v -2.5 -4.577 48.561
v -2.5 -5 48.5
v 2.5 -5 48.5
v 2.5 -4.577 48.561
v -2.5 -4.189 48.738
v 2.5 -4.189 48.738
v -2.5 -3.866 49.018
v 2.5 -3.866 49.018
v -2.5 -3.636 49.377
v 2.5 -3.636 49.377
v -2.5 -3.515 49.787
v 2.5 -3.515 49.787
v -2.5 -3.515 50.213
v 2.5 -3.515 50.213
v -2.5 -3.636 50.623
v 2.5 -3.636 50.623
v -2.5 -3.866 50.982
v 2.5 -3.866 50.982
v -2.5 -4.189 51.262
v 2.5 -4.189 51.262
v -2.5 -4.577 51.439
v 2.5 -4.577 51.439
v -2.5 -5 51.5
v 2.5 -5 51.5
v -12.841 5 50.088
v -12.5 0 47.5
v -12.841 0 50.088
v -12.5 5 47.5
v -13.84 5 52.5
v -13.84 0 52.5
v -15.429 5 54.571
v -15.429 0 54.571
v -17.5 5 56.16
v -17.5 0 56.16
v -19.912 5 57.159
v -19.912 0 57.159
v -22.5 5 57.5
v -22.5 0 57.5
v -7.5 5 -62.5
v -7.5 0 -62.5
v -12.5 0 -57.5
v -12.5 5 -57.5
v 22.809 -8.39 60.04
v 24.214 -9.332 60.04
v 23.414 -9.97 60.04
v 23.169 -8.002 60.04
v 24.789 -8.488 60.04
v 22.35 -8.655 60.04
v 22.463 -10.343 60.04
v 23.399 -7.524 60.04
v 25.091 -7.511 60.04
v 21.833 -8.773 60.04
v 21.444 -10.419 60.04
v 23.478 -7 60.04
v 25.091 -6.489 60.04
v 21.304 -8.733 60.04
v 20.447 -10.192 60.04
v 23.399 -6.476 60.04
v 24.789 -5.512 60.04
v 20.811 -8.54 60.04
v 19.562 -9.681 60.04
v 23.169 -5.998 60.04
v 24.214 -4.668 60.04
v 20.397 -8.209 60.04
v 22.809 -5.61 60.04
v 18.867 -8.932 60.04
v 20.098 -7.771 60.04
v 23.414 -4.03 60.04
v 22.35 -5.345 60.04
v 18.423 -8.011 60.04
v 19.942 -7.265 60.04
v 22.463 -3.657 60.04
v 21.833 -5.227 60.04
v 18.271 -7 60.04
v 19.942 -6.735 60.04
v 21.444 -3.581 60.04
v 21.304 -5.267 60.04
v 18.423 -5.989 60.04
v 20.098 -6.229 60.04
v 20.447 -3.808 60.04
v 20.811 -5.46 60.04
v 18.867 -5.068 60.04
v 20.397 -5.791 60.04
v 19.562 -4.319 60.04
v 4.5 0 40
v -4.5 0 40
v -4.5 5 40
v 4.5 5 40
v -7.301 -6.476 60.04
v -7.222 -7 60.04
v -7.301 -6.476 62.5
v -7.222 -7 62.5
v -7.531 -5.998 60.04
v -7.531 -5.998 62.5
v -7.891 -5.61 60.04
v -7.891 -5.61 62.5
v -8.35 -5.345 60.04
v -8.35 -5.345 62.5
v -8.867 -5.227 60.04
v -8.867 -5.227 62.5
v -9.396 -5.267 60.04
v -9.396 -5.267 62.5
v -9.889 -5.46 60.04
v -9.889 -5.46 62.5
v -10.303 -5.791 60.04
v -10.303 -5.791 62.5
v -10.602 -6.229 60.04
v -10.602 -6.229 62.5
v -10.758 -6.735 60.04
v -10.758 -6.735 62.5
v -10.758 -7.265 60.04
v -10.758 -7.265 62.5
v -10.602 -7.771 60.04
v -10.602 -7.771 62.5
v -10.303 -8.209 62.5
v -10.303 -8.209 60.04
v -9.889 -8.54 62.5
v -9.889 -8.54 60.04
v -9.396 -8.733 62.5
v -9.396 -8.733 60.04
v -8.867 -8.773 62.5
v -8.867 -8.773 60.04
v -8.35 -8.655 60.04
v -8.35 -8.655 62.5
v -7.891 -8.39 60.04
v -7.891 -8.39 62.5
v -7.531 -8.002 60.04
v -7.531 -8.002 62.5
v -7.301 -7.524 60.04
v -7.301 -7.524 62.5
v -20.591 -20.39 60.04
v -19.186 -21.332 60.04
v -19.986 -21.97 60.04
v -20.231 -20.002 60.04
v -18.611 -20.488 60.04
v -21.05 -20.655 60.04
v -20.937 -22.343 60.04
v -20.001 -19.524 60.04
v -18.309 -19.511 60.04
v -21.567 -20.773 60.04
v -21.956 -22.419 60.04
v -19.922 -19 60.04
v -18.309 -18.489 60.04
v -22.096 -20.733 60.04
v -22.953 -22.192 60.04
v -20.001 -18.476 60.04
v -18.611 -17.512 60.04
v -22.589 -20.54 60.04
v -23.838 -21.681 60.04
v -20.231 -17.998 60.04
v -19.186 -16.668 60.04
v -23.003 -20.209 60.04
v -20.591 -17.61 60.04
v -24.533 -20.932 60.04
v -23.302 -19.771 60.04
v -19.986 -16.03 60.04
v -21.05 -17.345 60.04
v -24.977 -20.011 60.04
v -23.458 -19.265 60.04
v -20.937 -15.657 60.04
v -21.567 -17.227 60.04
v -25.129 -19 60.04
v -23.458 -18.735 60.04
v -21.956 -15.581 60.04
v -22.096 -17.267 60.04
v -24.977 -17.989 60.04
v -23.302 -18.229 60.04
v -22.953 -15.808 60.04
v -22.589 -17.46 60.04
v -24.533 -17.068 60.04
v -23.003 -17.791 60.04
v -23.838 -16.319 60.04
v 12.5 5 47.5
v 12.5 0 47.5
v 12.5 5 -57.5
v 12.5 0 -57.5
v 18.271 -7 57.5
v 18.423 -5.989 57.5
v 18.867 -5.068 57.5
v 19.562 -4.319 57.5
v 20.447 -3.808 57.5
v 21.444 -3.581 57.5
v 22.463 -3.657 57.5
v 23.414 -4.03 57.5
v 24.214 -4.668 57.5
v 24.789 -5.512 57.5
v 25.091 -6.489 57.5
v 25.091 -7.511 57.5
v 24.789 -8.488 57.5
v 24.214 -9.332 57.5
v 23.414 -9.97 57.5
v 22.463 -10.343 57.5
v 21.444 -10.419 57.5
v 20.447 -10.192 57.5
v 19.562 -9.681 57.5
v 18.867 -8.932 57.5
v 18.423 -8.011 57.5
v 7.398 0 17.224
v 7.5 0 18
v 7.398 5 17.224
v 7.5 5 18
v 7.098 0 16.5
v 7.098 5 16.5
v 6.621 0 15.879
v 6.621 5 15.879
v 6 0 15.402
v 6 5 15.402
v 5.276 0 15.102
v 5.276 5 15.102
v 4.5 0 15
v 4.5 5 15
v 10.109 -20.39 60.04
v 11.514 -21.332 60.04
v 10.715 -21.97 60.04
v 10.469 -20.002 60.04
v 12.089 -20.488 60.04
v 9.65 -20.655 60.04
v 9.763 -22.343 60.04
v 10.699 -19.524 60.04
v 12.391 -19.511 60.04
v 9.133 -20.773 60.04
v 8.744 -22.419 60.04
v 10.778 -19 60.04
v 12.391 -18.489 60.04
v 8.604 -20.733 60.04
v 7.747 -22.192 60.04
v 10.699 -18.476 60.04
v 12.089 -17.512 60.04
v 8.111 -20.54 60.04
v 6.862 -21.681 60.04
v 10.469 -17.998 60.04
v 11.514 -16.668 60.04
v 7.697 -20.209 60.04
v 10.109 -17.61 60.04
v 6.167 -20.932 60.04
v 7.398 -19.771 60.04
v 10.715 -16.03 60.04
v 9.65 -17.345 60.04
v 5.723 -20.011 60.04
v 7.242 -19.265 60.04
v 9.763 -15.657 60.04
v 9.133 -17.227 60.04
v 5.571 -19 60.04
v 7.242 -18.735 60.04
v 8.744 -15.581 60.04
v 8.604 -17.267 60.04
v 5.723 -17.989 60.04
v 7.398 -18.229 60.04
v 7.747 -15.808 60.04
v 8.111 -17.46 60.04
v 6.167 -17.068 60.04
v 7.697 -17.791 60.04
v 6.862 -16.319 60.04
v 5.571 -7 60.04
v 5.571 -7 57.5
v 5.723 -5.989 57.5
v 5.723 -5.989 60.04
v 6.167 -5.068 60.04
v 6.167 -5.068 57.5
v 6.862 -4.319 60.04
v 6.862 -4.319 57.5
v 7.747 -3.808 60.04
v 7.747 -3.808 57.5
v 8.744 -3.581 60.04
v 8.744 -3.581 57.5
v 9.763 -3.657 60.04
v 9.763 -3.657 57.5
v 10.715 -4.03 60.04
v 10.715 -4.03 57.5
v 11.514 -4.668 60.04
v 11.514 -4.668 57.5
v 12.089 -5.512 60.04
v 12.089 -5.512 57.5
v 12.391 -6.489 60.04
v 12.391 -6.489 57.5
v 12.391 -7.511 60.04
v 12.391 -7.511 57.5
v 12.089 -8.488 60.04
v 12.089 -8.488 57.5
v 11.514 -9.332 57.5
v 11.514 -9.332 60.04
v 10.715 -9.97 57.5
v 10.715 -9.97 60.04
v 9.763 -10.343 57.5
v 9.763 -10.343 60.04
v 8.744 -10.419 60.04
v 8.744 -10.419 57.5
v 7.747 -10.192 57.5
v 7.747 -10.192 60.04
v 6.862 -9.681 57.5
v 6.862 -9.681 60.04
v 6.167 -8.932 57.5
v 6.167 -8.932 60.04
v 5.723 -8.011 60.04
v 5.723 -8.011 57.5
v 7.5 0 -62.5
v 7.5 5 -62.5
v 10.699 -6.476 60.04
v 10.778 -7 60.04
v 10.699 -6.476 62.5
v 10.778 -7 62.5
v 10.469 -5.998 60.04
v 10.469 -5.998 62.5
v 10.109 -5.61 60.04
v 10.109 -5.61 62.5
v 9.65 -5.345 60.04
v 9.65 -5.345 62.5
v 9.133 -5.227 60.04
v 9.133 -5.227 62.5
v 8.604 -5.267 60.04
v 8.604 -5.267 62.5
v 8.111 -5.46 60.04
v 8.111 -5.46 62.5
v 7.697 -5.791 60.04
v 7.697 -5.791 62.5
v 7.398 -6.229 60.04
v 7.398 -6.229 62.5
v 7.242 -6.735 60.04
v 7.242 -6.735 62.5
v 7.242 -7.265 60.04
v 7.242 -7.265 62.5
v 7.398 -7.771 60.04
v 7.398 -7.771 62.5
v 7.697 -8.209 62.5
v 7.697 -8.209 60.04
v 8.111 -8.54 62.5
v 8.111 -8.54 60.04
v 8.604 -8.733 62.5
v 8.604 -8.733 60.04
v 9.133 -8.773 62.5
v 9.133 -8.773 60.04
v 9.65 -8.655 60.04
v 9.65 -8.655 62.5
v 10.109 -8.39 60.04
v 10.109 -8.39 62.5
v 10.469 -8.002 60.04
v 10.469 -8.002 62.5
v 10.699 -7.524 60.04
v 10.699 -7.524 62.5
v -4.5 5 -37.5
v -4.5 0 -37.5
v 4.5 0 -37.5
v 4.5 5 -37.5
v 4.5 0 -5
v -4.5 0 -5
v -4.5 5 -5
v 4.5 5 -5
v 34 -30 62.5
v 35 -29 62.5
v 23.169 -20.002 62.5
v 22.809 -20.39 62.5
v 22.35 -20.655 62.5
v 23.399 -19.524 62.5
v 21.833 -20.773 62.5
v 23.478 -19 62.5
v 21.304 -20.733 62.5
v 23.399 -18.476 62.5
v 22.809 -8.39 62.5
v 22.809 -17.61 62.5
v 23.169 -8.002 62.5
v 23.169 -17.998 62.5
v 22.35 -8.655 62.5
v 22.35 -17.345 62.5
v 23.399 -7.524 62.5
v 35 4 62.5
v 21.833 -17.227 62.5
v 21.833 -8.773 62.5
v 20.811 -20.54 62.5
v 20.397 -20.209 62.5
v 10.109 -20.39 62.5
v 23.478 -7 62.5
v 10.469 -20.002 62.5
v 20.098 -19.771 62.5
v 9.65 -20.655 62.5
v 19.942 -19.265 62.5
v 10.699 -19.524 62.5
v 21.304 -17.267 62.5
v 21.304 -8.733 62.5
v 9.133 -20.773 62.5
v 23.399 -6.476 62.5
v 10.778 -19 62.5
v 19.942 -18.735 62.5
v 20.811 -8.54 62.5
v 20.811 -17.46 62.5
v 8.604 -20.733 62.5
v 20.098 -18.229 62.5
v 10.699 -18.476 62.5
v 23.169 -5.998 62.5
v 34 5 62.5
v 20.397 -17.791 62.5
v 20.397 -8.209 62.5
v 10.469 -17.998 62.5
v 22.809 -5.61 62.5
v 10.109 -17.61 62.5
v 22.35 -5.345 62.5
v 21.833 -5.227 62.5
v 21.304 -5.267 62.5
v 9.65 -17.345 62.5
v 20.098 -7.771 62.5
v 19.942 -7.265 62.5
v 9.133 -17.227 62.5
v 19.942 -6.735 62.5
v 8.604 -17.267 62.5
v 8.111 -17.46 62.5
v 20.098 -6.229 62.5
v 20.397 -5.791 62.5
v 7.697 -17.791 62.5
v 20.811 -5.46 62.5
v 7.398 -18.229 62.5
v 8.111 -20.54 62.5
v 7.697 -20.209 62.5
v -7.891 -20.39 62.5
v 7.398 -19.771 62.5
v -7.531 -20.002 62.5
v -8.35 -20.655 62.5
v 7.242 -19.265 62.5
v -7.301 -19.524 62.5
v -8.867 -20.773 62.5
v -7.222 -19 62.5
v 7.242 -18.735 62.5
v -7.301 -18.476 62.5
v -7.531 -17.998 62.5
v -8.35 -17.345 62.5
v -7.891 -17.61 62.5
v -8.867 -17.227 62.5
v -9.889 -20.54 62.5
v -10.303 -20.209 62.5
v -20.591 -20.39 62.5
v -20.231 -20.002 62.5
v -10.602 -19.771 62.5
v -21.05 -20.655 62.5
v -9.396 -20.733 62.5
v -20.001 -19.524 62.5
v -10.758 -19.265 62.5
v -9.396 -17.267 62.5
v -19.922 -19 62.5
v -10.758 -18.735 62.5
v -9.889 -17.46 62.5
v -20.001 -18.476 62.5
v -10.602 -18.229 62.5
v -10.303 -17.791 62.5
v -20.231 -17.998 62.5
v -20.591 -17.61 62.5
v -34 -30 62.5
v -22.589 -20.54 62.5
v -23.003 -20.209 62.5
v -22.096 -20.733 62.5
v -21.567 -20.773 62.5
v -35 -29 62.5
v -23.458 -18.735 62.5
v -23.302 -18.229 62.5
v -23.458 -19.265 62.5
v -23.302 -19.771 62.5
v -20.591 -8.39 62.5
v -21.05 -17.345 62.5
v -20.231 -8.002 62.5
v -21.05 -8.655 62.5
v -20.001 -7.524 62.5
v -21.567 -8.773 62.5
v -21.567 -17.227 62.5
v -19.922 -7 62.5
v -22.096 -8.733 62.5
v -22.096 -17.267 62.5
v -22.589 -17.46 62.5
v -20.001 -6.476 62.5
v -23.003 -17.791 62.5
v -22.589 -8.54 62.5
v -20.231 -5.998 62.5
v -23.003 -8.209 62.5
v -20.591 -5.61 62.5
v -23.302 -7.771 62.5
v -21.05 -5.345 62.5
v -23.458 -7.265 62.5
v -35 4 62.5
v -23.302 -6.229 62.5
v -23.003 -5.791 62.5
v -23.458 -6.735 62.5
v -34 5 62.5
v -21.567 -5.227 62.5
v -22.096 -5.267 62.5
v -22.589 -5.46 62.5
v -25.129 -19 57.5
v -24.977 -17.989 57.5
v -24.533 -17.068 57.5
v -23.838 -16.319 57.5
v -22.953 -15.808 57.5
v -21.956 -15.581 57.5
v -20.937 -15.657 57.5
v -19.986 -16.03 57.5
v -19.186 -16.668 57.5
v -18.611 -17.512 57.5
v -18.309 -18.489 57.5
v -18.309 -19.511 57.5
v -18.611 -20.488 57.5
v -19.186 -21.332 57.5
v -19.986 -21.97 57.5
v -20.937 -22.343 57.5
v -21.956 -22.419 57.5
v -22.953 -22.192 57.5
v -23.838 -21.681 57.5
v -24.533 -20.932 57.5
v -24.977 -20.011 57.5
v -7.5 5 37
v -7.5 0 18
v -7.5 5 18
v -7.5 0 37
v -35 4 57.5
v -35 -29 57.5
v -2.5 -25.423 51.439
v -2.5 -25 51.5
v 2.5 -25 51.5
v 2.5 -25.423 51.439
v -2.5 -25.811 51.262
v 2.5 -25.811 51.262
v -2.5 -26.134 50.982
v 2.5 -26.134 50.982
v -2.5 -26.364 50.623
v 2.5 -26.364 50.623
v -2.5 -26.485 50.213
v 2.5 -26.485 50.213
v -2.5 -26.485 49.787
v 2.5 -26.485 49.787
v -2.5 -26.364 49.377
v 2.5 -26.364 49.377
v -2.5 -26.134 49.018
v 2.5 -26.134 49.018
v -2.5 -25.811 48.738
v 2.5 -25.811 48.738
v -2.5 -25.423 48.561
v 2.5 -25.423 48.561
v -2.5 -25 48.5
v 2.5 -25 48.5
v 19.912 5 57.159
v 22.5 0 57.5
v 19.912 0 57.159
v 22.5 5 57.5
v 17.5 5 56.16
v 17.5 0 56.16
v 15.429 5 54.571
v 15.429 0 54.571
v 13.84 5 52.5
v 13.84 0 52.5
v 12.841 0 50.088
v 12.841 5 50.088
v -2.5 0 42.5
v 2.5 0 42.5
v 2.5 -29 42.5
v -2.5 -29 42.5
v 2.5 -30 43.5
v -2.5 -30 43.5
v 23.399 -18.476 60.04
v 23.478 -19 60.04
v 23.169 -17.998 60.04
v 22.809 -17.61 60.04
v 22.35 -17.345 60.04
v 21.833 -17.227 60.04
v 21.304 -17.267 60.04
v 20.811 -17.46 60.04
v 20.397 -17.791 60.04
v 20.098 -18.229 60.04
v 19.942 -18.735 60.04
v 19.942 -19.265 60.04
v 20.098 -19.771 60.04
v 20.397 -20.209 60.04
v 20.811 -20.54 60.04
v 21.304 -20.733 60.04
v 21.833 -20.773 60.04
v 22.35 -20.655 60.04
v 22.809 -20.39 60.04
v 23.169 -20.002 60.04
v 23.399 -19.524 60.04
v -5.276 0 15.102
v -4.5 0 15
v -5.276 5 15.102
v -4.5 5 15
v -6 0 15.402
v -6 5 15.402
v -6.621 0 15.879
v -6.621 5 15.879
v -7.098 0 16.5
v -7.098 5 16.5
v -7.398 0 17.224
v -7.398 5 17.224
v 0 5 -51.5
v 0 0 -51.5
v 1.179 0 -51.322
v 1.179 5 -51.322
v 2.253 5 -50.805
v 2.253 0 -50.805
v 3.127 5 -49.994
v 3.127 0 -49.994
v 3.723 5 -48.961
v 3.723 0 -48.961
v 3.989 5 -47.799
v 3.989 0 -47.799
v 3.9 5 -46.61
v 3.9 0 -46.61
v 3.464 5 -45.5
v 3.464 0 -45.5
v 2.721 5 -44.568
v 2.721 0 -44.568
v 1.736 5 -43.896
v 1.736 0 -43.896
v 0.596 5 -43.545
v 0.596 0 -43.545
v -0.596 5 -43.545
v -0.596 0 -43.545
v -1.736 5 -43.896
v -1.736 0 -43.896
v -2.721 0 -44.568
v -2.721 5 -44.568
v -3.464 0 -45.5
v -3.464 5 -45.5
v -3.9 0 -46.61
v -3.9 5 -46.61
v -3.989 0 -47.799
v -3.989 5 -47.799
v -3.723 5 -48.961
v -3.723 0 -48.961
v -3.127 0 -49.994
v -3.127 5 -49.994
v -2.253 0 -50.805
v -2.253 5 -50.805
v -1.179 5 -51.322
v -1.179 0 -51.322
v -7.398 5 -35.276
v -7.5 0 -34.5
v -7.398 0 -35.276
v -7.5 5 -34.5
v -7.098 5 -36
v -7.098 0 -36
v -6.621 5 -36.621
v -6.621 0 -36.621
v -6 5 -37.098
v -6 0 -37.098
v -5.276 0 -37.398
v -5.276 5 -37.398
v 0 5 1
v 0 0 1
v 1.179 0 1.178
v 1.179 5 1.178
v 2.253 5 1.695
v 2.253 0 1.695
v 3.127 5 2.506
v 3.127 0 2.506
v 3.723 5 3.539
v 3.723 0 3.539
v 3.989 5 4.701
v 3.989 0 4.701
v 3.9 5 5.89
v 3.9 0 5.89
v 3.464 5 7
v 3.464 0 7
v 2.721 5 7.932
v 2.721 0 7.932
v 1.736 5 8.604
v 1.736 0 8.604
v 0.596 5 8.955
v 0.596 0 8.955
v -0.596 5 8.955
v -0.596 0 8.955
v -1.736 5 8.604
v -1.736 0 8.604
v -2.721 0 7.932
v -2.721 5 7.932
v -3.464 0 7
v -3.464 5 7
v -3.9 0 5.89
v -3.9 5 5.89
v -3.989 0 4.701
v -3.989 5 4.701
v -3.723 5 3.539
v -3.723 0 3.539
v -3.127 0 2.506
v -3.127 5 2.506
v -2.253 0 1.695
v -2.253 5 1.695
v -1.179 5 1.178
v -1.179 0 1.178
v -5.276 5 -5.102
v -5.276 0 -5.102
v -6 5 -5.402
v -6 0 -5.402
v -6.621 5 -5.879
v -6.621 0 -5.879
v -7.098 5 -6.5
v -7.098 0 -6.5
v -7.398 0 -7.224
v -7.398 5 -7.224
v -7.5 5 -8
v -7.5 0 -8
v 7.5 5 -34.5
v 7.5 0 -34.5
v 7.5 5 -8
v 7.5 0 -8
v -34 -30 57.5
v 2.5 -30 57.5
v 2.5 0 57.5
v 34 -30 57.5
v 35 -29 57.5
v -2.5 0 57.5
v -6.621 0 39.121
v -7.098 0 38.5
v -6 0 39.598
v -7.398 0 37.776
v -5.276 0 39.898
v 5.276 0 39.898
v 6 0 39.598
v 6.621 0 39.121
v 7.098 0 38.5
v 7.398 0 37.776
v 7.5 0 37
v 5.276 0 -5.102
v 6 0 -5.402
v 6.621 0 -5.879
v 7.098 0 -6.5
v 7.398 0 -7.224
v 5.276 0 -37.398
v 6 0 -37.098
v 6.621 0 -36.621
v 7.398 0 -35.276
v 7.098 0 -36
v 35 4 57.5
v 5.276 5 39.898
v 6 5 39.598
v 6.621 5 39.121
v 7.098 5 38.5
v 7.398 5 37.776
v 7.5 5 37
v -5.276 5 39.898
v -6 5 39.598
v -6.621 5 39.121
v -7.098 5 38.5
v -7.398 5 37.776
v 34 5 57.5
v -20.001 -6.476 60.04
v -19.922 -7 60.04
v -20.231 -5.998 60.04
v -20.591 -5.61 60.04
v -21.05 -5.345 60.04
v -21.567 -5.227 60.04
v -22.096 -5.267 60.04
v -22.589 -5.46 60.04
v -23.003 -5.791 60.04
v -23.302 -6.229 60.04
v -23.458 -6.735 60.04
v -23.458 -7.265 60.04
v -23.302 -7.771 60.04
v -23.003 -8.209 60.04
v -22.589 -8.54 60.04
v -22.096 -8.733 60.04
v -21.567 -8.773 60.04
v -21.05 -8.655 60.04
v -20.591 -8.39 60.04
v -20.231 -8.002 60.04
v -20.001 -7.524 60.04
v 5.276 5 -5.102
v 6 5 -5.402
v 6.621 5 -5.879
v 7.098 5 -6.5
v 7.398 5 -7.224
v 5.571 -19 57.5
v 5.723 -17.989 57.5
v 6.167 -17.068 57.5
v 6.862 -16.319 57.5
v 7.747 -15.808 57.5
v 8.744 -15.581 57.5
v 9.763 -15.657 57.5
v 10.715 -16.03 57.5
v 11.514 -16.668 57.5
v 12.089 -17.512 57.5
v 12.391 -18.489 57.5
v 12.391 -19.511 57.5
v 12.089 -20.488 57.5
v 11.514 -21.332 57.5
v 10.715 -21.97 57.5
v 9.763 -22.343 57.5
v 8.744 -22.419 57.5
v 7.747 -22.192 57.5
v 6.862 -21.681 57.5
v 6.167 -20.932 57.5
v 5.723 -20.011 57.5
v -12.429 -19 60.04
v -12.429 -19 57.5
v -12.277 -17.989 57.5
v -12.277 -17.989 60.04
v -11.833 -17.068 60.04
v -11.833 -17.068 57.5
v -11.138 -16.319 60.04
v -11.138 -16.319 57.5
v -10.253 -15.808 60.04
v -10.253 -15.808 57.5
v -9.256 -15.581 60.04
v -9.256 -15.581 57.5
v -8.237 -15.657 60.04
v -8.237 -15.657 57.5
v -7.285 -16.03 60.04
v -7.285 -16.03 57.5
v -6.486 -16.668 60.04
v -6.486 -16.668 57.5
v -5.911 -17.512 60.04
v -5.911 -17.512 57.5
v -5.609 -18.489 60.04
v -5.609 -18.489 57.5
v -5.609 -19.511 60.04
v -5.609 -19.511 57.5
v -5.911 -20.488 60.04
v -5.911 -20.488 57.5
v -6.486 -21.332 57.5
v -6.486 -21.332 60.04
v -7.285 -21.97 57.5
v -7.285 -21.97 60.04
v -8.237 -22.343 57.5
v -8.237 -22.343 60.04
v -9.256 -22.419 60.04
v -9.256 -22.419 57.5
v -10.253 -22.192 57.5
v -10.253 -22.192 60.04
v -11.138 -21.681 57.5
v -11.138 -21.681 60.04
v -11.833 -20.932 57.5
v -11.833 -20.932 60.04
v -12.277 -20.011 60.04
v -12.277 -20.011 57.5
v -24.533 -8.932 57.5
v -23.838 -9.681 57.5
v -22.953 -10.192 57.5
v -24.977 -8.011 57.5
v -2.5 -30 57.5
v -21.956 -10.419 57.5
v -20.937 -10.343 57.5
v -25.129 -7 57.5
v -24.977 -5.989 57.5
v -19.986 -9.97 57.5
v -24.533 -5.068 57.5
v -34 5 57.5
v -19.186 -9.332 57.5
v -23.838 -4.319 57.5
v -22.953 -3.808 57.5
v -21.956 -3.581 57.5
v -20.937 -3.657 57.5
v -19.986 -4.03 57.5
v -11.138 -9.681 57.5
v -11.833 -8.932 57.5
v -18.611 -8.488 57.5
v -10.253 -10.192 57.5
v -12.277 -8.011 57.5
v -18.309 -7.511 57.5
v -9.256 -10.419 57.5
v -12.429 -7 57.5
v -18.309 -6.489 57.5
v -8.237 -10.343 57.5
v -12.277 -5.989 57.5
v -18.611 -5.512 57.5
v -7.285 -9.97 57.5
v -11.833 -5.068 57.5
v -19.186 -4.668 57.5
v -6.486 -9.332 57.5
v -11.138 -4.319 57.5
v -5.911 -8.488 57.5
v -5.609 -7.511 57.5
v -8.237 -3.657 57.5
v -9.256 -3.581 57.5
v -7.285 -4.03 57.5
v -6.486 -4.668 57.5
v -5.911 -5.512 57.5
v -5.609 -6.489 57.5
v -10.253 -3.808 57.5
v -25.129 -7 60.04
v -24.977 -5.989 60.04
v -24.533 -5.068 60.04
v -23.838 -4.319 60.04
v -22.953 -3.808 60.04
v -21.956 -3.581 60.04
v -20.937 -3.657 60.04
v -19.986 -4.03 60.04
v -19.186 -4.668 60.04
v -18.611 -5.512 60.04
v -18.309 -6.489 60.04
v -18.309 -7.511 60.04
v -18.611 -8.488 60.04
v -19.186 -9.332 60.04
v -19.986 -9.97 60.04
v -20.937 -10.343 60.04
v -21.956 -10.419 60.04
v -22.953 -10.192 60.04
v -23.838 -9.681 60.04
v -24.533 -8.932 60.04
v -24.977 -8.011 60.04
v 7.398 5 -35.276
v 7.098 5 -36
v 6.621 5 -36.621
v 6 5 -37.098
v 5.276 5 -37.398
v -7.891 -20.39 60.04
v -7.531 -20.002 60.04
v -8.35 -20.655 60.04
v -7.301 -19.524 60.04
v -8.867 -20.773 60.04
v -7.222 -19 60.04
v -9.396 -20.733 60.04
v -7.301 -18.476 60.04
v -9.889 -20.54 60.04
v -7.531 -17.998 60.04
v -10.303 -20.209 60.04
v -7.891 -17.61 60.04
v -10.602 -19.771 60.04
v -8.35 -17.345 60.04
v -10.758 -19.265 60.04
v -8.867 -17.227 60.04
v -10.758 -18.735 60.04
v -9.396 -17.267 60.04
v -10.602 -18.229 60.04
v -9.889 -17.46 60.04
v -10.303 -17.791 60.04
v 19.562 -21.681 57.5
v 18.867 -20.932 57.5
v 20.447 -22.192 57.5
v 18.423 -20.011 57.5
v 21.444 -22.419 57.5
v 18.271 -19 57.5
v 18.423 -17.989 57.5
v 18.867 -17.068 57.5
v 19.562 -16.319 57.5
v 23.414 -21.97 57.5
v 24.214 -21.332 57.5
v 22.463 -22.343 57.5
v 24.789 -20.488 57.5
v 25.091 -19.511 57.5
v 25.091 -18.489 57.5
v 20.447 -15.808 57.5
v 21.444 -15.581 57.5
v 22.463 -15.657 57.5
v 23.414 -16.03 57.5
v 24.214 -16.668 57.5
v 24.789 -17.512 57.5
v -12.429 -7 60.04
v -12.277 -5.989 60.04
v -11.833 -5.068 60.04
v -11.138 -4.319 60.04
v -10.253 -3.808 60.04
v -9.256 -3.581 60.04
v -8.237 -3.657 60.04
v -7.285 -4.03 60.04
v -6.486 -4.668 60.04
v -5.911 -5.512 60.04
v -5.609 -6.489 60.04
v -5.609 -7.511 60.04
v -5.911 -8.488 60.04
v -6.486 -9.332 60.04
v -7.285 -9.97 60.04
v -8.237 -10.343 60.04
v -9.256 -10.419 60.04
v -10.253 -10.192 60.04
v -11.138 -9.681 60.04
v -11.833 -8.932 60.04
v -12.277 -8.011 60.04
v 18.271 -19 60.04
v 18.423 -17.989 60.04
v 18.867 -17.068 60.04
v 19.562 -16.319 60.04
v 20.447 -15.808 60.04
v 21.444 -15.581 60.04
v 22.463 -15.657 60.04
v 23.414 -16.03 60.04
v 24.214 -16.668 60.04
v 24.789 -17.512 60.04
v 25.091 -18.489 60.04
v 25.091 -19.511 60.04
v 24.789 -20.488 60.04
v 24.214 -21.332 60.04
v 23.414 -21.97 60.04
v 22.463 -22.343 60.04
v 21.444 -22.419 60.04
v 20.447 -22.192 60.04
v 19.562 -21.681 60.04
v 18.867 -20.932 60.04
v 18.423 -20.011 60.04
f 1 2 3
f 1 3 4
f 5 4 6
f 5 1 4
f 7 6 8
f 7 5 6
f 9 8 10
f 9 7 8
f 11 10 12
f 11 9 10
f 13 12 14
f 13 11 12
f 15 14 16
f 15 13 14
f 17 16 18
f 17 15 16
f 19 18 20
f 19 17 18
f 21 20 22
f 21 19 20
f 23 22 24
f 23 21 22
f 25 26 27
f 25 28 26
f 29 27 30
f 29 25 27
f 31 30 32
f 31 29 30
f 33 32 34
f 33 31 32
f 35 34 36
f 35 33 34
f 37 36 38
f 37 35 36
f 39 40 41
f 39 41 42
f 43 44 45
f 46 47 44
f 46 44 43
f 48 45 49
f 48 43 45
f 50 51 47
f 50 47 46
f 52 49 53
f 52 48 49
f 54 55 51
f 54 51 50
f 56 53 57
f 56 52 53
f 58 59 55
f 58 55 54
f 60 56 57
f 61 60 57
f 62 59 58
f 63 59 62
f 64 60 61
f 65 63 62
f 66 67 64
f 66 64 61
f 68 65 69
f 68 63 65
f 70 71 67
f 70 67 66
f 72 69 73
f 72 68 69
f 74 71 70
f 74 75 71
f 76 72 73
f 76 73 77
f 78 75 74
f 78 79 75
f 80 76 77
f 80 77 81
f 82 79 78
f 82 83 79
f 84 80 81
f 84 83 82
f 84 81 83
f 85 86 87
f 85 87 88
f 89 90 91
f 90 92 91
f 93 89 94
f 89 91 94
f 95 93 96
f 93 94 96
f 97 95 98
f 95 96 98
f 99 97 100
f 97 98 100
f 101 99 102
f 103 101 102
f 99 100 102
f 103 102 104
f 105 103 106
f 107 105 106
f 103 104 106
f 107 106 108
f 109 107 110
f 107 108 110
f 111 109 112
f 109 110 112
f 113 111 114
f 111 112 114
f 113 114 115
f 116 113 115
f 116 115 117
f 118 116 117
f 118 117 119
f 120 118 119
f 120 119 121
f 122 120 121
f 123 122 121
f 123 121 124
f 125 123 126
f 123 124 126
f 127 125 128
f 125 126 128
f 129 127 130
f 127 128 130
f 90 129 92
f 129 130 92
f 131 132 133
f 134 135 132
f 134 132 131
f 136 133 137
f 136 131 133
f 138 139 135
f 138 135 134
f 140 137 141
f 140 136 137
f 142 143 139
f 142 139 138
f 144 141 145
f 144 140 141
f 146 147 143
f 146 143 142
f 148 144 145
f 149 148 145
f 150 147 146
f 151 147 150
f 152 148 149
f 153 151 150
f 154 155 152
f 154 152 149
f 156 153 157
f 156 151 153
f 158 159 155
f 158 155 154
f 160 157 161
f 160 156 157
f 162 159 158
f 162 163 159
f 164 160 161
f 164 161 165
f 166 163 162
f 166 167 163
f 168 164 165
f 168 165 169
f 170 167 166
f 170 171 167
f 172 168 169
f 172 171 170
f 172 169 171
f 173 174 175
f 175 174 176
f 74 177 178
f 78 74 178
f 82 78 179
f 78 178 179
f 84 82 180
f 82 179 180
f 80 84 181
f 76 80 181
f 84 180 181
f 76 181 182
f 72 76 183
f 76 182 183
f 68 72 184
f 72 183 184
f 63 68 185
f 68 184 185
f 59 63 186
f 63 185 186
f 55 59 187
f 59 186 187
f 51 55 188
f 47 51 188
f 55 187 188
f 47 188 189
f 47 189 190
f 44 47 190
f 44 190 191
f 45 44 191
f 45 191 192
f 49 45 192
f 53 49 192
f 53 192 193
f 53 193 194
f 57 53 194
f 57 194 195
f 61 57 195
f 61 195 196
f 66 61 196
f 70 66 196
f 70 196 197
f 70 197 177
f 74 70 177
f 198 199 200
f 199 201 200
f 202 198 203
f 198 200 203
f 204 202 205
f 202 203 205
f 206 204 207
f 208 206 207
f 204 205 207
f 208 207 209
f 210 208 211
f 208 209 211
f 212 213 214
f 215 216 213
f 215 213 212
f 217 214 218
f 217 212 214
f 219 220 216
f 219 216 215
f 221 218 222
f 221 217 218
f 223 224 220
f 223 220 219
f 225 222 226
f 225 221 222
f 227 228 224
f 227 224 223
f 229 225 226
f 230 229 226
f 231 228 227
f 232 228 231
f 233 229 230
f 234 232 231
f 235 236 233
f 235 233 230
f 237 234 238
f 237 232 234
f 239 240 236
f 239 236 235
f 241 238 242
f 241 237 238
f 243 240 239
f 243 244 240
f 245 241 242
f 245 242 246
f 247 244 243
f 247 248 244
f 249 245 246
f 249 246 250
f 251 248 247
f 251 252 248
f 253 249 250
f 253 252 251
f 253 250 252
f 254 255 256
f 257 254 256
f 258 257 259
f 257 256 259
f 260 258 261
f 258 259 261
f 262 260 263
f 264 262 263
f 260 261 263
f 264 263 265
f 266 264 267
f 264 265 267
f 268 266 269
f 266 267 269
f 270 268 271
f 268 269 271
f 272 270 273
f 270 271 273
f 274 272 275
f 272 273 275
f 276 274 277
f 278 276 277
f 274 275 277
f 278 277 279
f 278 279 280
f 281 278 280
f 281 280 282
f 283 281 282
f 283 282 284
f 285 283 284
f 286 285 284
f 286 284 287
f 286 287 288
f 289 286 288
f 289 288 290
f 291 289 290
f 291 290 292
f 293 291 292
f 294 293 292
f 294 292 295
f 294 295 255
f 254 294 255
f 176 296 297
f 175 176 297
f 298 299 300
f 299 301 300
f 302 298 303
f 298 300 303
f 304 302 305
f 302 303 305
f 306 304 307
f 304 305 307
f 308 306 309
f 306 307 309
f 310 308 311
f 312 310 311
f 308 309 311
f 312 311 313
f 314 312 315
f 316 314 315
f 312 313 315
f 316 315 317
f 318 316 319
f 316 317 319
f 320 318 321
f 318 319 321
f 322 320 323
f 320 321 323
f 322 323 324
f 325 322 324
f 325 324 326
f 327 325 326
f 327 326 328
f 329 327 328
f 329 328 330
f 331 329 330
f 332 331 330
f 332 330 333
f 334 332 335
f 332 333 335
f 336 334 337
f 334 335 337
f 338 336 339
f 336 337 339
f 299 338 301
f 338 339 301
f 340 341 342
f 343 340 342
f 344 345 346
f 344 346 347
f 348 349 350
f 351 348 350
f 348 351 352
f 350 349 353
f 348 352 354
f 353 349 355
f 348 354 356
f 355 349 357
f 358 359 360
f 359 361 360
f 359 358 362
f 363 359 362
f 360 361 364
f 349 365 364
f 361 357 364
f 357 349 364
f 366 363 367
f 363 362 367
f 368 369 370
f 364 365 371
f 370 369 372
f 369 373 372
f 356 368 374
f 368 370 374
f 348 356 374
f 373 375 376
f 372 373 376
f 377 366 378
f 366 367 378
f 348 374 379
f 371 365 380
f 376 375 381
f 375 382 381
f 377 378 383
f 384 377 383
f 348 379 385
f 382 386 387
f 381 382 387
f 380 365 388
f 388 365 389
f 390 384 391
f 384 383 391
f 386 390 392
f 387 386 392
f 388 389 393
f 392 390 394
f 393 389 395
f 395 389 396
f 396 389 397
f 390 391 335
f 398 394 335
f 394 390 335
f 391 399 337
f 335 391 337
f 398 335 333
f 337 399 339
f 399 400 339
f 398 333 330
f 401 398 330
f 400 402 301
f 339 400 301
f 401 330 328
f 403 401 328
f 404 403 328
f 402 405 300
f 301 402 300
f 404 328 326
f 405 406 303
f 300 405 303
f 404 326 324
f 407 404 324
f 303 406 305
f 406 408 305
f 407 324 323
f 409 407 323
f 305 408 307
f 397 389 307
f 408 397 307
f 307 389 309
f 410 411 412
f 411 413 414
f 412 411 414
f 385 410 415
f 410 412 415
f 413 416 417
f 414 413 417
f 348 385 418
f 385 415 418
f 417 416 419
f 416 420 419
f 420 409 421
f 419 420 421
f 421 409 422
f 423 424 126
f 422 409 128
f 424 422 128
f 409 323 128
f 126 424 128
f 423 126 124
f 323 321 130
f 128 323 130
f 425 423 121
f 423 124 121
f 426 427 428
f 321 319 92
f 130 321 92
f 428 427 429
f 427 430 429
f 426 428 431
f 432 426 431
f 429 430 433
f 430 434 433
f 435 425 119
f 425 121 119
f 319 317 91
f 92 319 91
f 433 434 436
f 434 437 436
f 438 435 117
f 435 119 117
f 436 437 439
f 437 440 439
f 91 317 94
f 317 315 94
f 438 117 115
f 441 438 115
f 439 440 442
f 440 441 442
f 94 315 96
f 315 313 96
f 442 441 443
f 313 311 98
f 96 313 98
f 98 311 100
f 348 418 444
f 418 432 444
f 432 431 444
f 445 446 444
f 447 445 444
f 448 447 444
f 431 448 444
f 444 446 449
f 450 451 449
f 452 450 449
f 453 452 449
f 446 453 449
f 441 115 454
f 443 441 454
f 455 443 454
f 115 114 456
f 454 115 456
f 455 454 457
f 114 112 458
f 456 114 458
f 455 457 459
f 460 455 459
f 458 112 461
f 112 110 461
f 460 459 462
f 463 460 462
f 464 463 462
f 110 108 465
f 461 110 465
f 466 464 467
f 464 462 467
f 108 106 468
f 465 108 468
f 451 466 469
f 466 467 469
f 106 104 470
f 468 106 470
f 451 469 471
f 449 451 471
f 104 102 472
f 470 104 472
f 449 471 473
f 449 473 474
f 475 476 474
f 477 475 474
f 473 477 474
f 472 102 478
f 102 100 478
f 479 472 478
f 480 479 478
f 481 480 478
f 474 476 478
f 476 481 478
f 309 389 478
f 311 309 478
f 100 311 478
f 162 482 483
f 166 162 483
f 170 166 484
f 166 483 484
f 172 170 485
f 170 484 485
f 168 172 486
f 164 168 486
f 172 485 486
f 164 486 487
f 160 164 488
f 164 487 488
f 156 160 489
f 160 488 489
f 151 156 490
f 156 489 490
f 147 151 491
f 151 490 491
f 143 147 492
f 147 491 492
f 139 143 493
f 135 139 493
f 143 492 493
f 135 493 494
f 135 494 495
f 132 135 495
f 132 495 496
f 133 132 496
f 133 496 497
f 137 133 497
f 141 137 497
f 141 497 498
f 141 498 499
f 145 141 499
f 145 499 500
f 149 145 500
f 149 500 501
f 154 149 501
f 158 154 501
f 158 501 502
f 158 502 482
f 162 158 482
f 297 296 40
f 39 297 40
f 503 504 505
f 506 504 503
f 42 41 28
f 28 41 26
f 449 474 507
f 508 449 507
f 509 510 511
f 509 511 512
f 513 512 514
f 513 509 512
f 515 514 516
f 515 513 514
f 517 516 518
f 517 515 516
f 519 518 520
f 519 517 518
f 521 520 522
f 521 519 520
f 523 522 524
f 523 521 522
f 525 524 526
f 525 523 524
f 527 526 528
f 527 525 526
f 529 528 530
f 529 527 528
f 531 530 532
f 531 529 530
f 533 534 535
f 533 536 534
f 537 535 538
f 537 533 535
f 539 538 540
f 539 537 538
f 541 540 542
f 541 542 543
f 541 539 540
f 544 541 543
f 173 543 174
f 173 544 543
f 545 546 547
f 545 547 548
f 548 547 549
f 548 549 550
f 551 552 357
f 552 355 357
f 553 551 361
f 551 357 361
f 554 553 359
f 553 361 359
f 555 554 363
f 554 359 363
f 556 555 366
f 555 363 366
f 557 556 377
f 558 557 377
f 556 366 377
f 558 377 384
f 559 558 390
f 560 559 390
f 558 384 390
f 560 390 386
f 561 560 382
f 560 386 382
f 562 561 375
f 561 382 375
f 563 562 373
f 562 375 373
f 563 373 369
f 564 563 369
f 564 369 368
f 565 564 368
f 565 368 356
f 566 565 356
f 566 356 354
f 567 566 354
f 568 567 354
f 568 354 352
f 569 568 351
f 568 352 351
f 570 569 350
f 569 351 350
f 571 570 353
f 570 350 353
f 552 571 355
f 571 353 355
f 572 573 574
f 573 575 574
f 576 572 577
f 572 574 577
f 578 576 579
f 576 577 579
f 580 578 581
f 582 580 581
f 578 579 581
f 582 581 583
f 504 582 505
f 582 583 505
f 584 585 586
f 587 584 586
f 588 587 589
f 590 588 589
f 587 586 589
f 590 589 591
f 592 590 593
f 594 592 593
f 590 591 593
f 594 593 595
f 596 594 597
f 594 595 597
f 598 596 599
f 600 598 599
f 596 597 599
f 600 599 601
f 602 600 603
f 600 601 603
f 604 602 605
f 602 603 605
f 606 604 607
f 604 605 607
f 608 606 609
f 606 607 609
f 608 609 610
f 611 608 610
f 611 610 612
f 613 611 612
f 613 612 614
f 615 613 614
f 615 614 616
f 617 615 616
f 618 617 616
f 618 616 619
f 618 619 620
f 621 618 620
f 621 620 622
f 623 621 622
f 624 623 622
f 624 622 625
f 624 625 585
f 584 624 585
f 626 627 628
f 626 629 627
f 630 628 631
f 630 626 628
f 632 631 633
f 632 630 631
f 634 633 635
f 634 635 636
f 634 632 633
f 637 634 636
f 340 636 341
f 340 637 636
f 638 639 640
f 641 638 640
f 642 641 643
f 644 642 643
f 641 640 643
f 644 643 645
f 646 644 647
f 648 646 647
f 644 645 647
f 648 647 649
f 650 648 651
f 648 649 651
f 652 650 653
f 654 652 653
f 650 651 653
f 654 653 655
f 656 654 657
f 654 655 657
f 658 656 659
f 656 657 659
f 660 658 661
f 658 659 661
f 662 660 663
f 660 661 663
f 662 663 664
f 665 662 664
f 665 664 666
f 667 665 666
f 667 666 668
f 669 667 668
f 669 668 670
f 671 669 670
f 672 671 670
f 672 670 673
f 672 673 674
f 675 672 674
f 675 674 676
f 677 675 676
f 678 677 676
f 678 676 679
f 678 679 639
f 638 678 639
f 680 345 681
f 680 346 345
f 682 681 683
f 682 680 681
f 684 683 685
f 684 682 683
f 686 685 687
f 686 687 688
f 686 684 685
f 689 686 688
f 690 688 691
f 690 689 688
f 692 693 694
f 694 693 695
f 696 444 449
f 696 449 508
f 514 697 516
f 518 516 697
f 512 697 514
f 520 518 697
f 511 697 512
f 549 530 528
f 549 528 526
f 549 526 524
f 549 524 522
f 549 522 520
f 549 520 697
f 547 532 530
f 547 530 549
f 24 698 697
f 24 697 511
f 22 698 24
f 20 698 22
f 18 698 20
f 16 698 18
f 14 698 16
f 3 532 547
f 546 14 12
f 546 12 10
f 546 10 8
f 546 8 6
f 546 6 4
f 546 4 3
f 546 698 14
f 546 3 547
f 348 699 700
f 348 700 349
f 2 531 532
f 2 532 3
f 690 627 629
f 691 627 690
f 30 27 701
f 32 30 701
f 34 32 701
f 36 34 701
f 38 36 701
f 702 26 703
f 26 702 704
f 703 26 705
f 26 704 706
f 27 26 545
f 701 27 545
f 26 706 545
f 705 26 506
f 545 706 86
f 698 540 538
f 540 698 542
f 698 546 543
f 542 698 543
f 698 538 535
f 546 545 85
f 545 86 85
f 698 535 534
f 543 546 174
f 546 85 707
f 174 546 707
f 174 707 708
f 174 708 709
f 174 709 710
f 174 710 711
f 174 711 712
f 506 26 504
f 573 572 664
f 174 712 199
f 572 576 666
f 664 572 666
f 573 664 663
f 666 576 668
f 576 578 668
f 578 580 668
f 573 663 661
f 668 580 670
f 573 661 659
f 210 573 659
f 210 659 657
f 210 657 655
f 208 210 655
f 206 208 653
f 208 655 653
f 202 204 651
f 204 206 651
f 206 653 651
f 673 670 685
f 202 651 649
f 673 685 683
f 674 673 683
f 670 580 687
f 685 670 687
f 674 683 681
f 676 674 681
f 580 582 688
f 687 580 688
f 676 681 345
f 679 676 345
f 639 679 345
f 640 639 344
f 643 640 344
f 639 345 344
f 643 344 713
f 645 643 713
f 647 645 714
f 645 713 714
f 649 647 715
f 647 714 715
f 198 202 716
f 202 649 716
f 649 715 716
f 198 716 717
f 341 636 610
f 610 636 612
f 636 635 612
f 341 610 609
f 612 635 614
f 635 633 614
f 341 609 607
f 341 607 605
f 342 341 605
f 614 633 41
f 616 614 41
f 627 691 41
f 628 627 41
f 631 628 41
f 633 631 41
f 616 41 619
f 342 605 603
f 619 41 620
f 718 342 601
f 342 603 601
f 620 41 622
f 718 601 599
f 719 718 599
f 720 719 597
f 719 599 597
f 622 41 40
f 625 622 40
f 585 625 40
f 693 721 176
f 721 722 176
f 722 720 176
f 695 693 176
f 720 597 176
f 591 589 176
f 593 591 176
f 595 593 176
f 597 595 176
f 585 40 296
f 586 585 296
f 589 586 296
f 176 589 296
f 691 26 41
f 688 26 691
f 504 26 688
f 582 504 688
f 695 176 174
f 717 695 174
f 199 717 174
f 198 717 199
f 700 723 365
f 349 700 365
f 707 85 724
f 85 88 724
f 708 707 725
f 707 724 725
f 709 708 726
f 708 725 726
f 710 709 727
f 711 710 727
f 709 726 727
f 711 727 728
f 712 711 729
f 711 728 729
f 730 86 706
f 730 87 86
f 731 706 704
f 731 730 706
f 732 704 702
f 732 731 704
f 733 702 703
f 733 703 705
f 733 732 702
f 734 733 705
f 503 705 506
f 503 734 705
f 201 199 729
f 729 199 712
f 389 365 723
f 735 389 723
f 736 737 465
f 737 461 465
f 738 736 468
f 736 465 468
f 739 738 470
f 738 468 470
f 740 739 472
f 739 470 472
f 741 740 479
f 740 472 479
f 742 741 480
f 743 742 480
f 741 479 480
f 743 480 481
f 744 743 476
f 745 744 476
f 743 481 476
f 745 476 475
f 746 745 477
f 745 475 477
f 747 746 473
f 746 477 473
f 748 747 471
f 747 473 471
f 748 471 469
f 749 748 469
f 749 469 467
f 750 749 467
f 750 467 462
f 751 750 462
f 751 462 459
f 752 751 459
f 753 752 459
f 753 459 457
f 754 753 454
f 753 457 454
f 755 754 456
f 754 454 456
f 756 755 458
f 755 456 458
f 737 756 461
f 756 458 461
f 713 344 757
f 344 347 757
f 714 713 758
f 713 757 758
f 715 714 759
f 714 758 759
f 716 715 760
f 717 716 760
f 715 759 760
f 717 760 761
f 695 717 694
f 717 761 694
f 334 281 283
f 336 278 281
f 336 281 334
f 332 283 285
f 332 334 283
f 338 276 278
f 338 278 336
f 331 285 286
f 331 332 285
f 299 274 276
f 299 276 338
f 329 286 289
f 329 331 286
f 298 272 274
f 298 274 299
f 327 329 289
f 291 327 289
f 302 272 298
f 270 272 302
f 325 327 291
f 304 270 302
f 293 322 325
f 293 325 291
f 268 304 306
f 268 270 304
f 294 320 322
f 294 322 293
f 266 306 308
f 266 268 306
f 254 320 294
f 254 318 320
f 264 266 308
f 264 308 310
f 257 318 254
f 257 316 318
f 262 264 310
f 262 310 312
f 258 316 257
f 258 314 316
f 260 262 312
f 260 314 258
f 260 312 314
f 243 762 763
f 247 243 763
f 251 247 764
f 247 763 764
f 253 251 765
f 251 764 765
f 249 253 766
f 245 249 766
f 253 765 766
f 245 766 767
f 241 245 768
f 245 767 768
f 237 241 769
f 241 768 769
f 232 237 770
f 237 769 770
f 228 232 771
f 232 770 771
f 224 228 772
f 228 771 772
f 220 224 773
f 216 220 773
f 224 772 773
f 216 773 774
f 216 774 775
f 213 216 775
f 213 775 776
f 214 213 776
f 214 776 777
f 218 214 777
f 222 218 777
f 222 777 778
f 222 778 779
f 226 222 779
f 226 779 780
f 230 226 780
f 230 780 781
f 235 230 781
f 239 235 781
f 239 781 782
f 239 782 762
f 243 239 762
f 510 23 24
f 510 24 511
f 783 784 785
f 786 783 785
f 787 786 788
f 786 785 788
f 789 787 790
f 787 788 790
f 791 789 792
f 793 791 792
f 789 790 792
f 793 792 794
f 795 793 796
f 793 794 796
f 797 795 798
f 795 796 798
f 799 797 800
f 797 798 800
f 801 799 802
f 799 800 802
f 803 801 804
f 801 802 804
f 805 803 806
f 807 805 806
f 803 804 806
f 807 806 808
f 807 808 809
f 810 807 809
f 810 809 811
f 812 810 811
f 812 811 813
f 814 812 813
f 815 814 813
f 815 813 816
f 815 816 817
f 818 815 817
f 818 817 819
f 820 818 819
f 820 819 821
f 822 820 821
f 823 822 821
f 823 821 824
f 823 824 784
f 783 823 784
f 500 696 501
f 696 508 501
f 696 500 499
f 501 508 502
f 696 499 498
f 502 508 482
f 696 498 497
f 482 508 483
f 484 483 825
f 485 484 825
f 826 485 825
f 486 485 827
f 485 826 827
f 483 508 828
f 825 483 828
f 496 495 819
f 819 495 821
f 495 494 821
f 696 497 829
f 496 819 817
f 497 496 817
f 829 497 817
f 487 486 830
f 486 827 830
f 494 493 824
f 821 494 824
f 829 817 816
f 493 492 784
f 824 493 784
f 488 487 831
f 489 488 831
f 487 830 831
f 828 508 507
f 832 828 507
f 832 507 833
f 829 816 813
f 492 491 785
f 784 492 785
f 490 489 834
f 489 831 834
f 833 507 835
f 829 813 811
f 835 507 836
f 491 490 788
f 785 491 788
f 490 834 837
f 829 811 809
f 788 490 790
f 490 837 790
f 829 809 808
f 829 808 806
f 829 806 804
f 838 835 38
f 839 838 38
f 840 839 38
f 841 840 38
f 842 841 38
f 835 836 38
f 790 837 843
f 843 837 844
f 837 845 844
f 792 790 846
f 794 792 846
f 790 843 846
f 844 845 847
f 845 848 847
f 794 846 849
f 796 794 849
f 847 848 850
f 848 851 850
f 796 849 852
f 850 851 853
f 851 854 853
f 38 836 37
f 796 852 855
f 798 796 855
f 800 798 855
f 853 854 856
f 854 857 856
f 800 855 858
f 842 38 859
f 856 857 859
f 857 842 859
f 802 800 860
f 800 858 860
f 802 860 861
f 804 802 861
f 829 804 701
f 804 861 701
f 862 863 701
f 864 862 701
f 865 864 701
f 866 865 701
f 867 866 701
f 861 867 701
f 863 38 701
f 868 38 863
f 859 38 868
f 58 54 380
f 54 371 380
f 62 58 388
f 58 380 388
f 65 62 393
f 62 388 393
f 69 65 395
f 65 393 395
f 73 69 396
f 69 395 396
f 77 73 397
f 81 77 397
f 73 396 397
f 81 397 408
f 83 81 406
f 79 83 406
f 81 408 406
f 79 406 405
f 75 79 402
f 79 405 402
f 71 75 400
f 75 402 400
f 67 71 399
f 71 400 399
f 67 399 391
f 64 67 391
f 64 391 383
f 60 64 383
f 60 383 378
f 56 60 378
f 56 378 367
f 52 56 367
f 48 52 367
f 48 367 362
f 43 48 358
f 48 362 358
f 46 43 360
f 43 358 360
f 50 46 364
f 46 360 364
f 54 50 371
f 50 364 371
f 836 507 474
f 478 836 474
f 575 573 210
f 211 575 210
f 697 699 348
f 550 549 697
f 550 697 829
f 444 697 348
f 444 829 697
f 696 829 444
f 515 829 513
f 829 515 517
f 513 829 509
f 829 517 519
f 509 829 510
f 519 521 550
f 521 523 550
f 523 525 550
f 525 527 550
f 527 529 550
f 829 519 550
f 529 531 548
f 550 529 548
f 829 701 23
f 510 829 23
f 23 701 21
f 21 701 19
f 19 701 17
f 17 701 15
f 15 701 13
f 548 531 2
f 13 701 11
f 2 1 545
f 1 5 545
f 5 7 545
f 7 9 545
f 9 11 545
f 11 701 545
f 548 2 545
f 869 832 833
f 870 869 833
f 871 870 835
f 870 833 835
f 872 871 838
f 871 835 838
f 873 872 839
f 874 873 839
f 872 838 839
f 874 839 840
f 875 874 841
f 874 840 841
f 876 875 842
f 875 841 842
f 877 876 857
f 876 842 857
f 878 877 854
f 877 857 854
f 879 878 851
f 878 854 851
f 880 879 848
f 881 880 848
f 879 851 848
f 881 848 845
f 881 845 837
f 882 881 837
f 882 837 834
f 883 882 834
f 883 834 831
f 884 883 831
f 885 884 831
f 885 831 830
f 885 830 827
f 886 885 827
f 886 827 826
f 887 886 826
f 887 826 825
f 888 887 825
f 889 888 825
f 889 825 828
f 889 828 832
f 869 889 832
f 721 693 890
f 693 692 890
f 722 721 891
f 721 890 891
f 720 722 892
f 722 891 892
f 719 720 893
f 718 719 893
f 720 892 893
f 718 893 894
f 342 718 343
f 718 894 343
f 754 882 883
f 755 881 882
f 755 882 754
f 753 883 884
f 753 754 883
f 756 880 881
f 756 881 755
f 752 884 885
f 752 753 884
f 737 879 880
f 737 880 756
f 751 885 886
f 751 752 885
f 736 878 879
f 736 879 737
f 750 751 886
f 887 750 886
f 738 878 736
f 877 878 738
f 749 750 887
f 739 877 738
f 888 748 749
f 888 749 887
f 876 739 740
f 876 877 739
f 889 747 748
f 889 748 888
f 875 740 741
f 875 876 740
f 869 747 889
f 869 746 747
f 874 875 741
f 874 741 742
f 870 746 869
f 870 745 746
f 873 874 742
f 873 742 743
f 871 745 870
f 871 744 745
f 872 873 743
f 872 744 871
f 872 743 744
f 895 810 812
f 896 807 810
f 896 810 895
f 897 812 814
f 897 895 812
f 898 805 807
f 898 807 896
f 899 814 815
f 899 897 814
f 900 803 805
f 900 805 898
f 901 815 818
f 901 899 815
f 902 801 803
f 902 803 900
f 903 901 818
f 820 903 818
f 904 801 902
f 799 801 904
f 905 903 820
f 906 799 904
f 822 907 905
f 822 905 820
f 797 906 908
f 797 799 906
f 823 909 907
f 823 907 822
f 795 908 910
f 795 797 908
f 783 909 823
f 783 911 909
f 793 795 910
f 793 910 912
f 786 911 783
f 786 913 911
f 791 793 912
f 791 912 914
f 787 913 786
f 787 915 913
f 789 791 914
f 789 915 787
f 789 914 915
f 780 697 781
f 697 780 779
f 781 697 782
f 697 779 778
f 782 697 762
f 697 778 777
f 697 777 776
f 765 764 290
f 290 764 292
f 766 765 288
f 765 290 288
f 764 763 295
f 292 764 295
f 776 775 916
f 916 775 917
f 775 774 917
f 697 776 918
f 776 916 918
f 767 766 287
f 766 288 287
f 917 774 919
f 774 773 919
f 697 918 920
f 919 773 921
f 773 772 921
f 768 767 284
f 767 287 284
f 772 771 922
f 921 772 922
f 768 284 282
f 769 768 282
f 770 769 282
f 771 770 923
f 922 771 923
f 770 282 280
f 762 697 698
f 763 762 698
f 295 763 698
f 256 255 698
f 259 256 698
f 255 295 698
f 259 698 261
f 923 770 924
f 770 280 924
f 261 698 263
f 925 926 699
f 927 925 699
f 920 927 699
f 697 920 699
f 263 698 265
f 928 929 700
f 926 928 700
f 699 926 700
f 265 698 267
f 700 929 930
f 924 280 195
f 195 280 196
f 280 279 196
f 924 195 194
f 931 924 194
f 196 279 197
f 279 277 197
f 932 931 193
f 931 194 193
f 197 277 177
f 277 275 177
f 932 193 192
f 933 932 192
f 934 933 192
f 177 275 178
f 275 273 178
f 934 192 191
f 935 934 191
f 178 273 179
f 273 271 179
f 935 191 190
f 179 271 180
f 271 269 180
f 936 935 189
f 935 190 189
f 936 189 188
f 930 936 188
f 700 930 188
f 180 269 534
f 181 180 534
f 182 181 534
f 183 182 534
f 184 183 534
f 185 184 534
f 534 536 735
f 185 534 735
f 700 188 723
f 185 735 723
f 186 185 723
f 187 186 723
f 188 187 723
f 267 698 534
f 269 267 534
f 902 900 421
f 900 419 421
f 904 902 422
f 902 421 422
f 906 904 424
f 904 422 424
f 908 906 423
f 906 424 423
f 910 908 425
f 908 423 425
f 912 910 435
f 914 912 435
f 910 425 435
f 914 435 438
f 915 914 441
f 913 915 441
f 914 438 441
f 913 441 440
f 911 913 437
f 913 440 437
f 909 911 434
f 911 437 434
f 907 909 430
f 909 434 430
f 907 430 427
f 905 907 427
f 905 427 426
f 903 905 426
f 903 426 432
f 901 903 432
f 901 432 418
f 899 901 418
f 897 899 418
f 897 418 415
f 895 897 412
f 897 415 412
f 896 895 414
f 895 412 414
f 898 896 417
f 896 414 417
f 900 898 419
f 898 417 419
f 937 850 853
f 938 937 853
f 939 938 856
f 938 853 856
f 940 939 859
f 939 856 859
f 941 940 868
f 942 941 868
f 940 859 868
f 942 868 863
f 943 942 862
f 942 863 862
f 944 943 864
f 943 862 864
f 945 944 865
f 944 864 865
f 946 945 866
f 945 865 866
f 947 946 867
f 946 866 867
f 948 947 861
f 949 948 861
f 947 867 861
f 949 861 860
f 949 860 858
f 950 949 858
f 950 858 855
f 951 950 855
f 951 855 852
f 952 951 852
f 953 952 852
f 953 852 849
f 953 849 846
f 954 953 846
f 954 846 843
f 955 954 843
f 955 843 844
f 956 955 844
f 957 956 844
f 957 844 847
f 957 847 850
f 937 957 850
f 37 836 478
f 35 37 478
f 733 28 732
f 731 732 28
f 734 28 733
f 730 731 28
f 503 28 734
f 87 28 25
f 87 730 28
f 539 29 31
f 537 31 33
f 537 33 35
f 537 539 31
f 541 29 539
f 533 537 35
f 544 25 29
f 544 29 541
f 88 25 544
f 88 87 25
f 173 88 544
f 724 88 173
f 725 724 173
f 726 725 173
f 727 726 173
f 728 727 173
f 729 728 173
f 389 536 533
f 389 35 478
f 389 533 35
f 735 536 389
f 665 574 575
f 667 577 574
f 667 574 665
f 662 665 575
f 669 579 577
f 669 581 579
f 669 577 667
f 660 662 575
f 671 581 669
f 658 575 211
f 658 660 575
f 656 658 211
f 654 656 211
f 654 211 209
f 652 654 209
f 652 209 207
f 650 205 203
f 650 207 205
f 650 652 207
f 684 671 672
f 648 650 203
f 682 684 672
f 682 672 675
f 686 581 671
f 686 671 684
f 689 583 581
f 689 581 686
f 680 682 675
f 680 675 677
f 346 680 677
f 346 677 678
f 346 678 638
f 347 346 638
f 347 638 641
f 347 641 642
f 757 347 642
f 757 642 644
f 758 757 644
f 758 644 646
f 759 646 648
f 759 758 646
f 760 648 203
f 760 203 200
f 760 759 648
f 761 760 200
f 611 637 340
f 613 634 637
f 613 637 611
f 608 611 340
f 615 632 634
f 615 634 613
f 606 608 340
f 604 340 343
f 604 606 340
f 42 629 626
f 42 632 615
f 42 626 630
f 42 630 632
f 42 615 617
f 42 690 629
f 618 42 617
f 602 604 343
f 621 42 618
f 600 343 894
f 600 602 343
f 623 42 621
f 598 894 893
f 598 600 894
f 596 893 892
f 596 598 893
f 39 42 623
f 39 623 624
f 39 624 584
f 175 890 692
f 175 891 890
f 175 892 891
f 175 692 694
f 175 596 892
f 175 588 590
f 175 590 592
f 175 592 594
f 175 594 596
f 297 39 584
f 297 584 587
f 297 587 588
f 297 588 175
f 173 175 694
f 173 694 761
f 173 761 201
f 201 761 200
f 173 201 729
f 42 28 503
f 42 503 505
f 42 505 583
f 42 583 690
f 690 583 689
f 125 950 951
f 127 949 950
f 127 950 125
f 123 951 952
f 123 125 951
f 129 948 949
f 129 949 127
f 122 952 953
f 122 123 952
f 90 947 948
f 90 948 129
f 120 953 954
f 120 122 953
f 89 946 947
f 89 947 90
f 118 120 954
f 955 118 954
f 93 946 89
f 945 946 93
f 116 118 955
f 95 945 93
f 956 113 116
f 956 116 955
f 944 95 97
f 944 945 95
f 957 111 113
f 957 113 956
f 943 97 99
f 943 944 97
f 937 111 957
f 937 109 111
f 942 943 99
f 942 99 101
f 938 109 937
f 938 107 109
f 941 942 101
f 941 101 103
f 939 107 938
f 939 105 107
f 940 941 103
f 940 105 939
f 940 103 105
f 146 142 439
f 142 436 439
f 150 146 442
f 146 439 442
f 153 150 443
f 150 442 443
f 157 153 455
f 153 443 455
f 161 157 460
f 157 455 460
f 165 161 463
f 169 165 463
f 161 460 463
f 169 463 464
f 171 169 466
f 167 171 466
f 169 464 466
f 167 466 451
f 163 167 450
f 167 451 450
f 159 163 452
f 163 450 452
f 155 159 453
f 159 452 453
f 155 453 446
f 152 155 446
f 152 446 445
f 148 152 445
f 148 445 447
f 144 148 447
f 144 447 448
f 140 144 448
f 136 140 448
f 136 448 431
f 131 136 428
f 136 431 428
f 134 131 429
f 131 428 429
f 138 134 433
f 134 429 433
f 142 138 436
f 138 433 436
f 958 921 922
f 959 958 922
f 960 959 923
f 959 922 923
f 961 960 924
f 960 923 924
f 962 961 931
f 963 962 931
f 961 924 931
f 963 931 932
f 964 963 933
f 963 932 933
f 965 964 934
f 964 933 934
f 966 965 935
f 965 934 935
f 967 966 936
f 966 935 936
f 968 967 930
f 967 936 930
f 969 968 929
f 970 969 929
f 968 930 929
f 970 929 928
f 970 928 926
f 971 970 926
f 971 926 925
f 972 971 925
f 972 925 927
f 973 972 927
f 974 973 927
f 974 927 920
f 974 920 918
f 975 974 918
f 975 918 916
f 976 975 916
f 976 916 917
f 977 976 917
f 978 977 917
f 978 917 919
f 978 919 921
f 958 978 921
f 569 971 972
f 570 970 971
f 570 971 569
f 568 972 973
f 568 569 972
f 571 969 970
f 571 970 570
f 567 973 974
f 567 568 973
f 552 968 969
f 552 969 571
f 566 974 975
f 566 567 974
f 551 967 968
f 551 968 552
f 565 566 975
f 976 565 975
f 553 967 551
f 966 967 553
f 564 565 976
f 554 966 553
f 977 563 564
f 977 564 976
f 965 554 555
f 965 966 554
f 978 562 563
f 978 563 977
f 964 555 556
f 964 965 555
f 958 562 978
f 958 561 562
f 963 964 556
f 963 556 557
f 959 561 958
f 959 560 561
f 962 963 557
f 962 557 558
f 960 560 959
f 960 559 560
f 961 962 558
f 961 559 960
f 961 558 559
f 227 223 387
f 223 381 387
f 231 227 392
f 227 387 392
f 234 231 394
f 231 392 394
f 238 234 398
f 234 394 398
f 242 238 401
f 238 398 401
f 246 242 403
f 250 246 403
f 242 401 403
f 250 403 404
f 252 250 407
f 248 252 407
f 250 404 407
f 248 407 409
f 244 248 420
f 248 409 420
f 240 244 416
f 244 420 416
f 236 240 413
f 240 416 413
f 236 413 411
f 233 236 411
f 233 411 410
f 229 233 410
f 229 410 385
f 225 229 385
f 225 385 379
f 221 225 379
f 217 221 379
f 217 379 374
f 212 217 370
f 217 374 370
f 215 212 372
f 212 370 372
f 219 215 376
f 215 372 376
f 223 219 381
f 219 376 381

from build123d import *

# Parameters (mm, degrees)
BOSS_EXTRUDE1_DEPTH = 5
CHAMFER1_SIZE       = 5
BOSS_EXTRUDE3_DEPTH = 30
HOLE1_D             = 3.556
HOLE1_CBORE_D       = 6.858
HOLE1_CBORE_DEPTH   = 2.54
SKETCH9_R           = 4
CUT_EXTRUDE2_DEPTH  = 78.661122835
SKETCH10_W          = 15
SKETCH10_H          = 32.5
CUT_EXTRUDE3_DEPTH  = 78.661122835
CUT_EXTRUDE4_DEPTH  = 79.819413852
FILLET5_R           = 10
SKETCH13_W          = 15
SKETCH13_H          = 25
CUT_EXTRUDE5_DEPTH  = 78.661122835
FILLET3_R           = 3
CHAMFER3_SIZE       = 1


with BuildPart() as part:
    # Sketch1 → Boss-Extrude1 (new body)
    with BuildSketch(Plane(origin=(0, 0, 0), x_dir=(1, 0, 0), z_dir=(0, 1, 0))):
        Polygon((-12.5, 62.5), (-12.5, -57.5), (-35, -57.5), (-35, -62.5), (35, -62.5), (35, -57.5), (12.5, -57.5), (12.5, 62.5), align=None)
    extrude(amount=BOSS_EXTRUDE1_DEPTH)

    # Chamfer1
    chamfer1_edges = [part.edges().sort_by_distance(p)[0] for p in [
        (-12.5, 2.5, -62.5),
        (12.5, 2.5, -62.5),
    ]]
    chamfer(chamfer1_edges, length=CHAMFER1_SIZE)

    # Sketch5 → Boss-Extrude3 (add)
    with BuildSketch(Plane(origin=(0, 0, 0), x_dir=(-1, 0, 0), z_dir=(0, -1, 0))):
        Polygon((-35, -57.5), (-35, -62.5), (35, -62.5), (35, -57.5), (2.5, -57.5), (2.5, -42.5), (-2.5, -42.5), (-2.5, -57.5), align=None)
    extrude(amount=BOSS_EXTRUDE3_DEPTH)

    # Hole1 (through all)
    with Locations(Plane(origin=(0, 0, 57.5), x_dir=(-1, 0, 0), z_dir=(0, 0, -1))):
        with Locations((-21.7, -7), (-9, -7), (9, -7), (21.7, -7), (-9, -19), (-21.7, -19), (9, -19), (21.7, -19)):
            CounterBoreHole(HOLE1_D / 2, HOLE1_CBORE_D / 2, HOLE1_CBORE_DEPTH)

    # Sketch9 → Cut-Extrude2 (cut, through all)
    with BuildSketch(Plane.XZ):
        with Locations((0, -47.5)):
            Circle(SKETCH9_R)
        with Locations((0, 5)):
            Circle(SKETCH9_R)
    extrude(amount=-CUT_EXTRUDE2_DEPTH, mode=Mode.SUBTRACT)

    # Sketch10 → Cut-Extrude3 (cut, through all)
    with BuildSketch(Plane.XZ):
        with Locations((0, -21.25)):
            Rectangle(SKETCH10_W, SKETCH10_H)
    extrude(amount=-CUT_EXTRUDE3_DEPTH, mode=Mode.SUBTRACT)

    # Sketch12 → Cut-Extrude4 (cut, through all)
    with BuildSketch(Plane.ZY.offset(2.5)):
        with BuildLine():
            Line((51.5, -5), (51.5, -25))
            ThreePointArc((51.5, -25), (50, -26.5), (48.5, -25))
            Line((48.5, -25), (48.5, -5))
            ThreePointArc((48.5, -5), (50, -3.5), (51.5, -5))
        make_face()
    extrude(amount=-CUT_EXTRUDE4_DEPTH, mode=Mode.SUBTRACT)

    # Fillet5
    fillet5_edges = [part.edges().sort_by_distance(p)[0] for p in [
        (-12.5, 2.5, 57.5),
        (12.5, 2.5, 57.5),
    ]]
    fillet(fillet5_edges, radius=FILLET5_R)

    # Sketch13 → Cut-Extrude5 (cut, through all)
    with BuildSketch(Plane.XZ):
        with Locations((0, 27.5)):
            Rectangle(SKETCH13_W, SKETCH13_H)
    extrude(amount=-CUT_EXTRUDE5_DEPTH, mode=Mode.SUBTRACT)

    # Fillet3
    fillet3_edges = [part.edges().sort_by_distance(p)[0] for p in [
        (7.5, 2.5, -5),
        (-7.5, 2.5, -5),
        (-7.5, 2.5, -37.5),
        (7.5, 2.5, -37.5),
        (-7.5, 2.5, 15),
        (-7.5, 2.5, 40),
        (7.5, 2.5, 40),
        (7.5, 2.5, 15),
    ]]
    fillet(fillet3_edges, radius=FILLET3_R)

    # Chamfer3
    chamfer3_edges = [part.edges().sort_by_distance(p)[0] for p in [
        (35, 5, 60),
        (-35, 5, 60),
        (35, -30, 60),
        (-35, -30, 60),
        (0, -30, 42.5),
    ]]
    chamfer(chamfer3_edges, length=CHAMFER3_SIZE)


solid = part.part
